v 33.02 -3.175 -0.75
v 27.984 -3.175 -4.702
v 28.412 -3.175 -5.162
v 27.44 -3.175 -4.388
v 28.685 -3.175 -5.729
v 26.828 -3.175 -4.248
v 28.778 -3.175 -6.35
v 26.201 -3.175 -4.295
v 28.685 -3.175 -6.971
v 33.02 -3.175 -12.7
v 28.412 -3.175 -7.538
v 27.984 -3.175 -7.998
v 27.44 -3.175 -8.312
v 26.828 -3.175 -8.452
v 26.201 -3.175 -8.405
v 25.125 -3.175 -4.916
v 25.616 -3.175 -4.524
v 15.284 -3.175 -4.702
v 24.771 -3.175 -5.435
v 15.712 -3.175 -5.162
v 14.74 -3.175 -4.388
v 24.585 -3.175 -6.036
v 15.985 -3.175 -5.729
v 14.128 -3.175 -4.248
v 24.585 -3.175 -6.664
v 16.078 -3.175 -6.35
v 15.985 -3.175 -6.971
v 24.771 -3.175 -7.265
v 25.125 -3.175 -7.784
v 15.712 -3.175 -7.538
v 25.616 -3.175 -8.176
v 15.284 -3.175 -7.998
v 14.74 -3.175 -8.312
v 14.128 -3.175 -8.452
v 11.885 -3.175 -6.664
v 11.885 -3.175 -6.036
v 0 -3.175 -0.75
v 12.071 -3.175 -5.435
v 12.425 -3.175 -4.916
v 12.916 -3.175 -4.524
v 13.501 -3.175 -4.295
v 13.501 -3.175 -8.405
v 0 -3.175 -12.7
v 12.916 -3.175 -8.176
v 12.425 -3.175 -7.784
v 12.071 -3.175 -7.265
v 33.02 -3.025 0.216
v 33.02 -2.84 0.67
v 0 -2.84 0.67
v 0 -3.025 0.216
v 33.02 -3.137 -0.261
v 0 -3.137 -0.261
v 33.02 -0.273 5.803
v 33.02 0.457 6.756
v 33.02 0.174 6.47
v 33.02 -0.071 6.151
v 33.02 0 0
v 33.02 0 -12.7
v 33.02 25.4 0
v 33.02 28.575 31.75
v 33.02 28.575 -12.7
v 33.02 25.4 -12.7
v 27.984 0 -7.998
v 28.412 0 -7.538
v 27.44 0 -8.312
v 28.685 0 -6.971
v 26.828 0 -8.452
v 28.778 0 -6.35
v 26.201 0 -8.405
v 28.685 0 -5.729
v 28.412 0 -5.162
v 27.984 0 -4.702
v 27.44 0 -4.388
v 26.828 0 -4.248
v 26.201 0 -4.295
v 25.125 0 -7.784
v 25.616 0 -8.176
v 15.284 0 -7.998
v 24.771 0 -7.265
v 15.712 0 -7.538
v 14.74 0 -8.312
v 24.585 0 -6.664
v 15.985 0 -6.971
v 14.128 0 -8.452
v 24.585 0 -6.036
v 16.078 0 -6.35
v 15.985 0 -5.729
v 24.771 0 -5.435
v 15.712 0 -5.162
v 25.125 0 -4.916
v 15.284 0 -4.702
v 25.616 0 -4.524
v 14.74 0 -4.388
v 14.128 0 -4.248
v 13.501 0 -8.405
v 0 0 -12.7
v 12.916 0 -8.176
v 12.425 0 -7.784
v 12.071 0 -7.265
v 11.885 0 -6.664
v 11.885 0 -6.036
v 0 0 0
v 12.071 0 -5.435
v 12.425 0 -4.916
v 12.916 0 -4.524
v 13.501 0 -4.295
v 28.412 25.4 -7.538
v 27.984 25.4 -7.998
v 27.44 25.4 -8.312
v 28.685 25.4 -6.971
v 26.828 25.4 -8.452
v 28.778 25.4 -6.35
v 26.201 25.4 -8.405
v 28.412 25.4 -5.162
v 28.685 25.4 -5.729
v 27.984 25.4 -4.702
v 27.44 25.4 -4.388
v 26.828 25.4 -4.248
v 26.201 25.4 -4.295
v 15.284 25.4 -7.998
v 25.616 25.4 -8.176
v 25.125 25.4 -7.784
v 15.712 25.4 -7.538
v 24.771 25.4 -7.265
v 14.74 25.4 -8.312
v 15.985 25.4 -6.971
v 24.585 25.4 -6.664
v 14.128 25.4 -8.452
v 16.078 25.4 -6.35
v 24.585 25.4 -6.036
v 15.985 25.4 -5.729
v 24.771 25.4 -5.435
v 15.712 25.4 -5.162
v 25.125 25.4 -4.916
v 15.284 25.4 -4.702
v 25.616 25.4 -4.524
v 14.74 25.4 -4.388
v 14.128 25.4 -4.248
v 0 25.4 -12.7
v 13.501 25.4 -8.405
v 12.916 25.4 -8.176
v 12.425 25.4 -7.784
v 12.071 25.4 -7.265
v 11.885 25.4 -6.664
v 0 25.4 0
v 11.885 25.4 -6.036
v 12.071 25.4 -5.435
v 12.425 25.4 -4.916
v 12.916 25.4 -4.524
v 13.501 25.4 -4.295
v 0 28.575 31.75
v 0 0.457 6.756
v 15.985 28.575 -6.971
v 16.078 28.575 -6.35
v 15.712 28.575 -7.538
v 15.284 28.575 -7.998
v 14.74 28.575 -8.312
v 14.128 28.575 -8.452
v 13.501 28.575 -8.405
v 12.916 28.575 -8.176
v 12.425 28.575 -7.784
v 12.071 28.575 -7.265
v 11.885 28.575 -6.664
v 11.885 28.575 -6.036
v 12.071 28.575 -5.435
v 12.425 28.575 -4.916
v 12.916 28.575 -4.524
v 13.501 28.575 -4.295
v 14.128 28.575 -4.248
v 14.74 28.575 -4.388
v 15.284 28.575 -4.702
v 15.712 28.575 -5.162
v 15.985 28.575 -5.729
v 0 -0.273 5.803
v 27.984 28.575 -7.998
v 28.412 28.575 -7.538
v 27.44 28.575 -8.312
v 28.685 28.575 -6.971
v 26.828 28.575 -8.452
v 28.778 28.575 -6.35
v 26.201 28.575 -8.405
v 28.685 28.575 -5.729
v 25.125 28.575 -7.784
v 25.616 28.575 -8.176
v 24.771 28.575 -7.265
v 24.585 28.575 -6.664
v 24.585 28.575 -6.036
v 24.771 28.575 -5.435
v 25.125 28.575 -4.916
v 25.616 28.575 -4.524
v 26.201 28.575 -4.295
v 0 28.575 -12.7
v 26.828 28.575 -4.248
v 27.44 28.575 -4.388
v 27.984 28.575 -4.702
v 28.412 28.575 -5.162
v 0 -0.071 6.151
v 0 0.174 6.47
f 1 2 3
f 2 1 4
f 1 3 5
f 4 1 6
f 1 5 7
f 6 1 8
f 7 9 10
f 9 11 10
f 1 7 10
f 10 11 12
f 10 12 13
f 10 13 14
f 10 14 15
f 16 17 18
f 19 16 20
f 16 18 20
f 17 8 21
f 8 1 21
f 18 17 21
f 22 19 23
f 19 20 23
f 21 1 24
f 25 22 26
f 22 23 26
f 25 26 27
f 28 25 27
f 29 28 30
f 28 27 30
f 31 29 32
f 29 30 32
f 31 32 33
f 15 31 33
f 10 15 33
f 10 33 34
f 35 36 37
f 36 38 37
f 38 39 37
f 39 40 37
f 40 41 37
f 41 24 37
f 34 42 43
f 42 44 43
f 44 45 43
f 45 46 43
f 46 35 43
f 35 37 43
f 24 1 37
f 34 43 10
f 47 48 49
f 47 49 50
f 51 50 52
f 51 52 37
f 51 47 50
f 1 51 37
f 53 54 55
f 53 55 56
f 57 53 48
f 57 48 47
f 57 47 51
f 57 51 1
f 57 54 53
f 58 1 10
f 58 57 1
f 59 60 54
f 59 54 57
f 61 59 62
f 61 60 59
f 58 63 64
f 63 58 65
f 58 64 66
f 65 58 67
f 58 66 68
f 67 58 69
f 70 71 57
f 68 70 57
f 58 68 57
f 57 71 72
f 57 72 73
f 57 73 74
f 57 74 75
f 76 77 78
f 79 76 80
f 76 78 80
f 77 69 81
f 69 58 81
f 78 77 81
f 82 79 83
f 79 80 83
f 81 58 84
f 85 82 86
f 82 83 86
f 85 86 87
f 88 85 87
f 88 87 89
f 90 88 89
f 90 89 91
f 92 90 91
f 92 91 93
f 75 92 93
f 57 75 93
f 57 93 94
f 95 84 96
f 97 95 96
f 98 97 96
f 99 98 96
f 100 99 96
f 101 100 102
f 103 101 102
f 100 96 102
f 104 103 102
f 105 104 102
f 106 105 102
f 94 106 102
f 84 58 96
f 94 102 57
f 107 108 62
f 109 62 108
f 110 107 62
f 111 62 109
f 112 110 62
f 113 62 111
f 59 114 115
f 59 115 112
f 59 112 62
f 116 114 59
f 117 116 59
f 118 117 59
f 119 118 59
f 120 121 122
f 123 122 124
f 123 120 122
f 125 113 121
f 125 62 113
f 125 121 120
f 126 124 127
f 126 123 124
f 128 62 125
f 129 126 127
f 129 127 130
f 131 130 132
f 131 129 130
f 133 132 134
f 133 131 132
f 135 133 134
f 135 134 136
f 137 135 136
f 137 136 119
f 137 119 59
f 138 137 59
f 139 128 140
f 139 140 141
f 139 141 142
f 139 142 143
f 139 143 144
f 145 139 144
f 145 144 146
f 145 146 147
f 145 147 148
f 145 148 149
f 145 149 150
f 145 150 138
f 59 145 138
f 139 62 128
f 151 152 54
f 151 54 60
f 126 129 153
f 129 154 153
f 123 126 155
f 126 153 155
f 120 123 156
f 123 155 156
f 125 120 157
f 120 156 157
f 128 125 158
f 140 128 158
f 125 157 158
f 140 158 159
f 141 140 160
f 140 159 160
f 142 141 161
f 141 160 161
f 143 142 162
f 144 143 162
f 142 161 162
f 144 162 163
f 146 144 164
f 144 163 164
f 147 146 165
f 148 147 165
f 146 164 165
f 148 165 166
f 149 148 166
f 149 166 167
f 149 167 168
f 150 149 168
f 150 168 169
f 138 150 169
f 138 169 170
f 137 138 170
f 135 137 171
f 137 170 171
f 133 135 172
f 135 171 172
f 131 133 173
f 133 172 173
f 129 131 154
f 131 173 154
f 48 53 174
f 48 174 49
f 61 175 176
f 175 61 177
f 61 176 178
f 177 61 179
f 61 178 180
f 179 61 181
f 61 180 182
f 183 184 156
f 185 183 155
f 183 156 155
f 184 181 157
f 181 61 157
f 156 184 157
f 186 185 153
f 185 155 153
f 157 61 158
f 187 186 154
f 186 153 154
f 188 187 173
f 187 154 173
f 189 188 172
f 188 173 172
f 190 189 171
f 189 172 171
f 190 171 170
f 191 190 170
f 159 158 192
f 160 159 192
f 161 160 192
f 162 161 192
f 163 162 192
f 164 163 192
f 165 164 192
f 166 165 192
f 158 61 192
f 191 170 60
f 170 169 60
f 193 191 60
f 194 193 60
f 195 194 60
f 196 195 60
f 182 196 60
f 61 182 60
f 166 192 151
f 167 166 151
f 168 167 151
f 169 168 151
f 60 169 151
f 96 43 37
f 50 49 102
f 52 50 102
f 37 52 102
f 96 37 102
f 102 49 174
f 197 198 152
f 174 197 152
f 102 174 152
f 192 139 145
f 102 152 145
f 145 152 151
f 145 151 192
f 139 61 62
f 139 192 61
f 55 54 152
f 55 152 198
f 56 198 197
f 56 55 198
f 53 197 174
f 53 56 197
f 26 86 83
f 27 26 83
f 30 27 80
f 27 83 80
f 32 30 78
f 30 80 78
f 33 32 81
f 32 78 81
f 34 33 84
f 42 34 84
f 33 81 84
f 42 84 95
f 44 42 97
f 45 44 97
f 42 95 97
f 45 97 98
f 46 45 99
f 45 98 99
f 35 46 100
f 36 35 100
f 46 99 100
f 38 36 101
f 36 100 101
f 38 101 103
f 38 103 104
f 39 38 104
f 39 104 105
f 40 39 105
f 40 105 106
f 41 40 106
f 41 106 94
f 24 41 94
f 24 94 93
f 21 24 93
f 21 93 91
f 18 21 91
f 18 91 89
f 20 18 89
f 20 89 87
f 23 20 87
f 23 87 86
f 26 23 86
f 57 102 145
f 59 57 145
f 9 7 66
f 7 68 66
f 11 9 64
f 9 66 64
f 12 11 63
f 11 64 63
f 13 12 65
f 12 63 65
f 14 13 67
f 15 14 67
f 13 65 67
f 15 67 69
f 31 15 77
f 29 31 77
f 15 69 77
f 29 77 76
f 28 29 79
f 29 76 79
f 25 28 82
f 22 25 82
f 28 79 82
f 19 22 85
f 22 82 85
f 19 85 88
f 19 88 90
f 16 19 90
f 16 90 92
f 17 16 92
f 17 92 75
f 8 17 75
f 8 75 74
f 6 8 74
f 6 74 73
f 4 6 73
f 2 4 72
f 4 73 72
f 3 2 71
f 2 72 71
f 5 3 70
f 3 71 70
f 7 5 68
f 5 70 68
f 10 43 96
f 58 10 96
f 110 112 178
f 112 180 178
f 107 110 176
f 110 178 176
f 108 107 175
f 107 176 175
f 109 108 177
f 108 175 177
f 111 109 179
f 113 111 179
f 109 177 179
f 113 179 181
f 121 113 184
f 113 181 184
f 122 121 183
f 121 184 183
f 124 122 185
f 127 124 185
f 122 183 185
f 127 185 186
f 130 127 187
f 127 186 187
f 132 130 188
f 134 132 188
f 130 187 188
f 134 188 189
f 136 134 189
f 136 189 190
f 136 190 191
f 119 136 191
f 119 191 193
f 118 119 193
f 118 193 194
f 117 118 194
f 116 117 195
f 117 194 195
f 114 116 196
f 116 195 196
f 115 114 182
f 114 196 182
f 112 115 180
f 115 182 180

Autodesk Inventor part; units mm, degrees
ref_plane "YZ Plane" through (0, 0, 0) normal (1, 0, 0) x (0, 1, 0)
ref_plane "XZ Plane" through (0, 0, 0) normal (0, 1, 0) x (-1, 0, 0)
ref_plane "XY Plane" through (0, 0, 0) normal (0, 0, 1) x (1, 0, 0)
sketch "Sketch1" plane through (0, 0, 0) normal (1, 0, 0) x (0, 1, 0)
  line L0 (0, 0) -> (25.4, 0)
  line L1 (25.4, 0) -> (28.575, 0)
  line L2 (28.575, 0) -> (28.575, -12.7)
  line L3 (28.575, -12.7) -> (25.4, -12.7)
  line L4 (25.4, -12.7) -> (25.4, 0)
  line L5 (28.575, 0) -> (28.575, 31.75)
  line L6 (0, 0) -> (0, 6.35)
  line L7 (0, 6.35) -> (28.575, 31.75)
  line L8 (0, 0) -> (-3.175, 0)
  line L9 (-3.175, 0) -> (-3.175, -12.7)
  line L10 (-3.175, -12.7) -> (0, -12.7)
  line L11 (0, -12.7) -> (0, 0)
  line L12 (0, 6.35) -> (-3.175, 0)
  dimension "d0" = 25.4
  dimension "d1" = 3.175
  dimension "d2" = 12.7
  dimension "d3" = 31.75
  dimension "d16" = 6.35
  dimension "d17" = 3.175
extrude "Extrusion1" add sketch "Sketch1" along normal blind 53.34
sketch "Sketch2" plane through (0, 28.575, 31.75) normal (0, 1, 0) x (1, 0, 0)
  line L0 (53.34, 44.45) -> (53.34, 38.1)
  line L1 (53.34, 44.45) -> (53.34, 0) projected
  line L2 (53.34, 38.1) -> (26.67, 38.1)
  circle A0 centre (26.67, 38.1) radius 2.1082
  point P0 (0, 31.75)
  dimension "d6" = 6.35
  dimension "d7" = 26.67
  dimension "d8" = 4.2164
extrude "Extrusion2" cut sketch "Sketch2" against normal blind 43.815
sketch "Sketch3" plane through (53.34, 0, 0) normal (1, 0, 0) x (0, 0, -1)
  line L0 (12.7, 25.4) -> (12.7, 28.575) projected
  line L1 (12.7, 28.575) -> (-16.4619, 28.575)
  line L2 (-16.4619, 28.575) -> (-16.4619, 0)
  line L3 (-16.4619, 0) -> (12.7, 0)
  line L4 (12.7, 0) -> (12.7, 28.575)
  line L5 (-16.4619, 0) -> (-35.4962, 0)
  line L6 (-35.4962, 0) -> (-35.4962, 28.575)
  line L7 (-35.4962, 28.575) -> (-16.4619, 28.575)
  line L8 (-16.4619, 28.575) -> (-16.4619, 0)
  line L9 (12.7, -3.175) -> (12.7, 0) projected
  line L10 (12.7, 0) -> (-7.1998, 0)
  line L11 (-7.1998, 0) -> (-7.1998, -5.5168)
  line L12 (-7.1998, -5.5168) -> (12.7, -5.5168)
  line L13 (12.7, -5.5168) -> (12.7, 0)
  point P0 (0, 0)
  point P1 (12.7, 25.4)
extrude "Extrusion3" cut sketch "Sketch3" against normal blind 20.32
sketch "Sketch4" plane through (0, 28.575, 31.75) normal (0, 1, 0) x (1, 0, 0)
  circle A0 centre (26.67, 38.1) radius 2.1082 projected
  line L0 (26.67, 38.1) -> (13.97, 38.1)
  circle A1 centre (13.97, 38.1) radius 2.1082
  point P0 (0, 31.75)
  dimension "d13" = 12.7
extrude "Extrusion4" cut sketch "Sketch4" against normal blind 2514.6 contours A1
fillet "Fillet1" radius 3.175 2 edges at (16.51, 0, 6.35) (16.51, -3.175, 0)
properties part number "sleds v2 big"
